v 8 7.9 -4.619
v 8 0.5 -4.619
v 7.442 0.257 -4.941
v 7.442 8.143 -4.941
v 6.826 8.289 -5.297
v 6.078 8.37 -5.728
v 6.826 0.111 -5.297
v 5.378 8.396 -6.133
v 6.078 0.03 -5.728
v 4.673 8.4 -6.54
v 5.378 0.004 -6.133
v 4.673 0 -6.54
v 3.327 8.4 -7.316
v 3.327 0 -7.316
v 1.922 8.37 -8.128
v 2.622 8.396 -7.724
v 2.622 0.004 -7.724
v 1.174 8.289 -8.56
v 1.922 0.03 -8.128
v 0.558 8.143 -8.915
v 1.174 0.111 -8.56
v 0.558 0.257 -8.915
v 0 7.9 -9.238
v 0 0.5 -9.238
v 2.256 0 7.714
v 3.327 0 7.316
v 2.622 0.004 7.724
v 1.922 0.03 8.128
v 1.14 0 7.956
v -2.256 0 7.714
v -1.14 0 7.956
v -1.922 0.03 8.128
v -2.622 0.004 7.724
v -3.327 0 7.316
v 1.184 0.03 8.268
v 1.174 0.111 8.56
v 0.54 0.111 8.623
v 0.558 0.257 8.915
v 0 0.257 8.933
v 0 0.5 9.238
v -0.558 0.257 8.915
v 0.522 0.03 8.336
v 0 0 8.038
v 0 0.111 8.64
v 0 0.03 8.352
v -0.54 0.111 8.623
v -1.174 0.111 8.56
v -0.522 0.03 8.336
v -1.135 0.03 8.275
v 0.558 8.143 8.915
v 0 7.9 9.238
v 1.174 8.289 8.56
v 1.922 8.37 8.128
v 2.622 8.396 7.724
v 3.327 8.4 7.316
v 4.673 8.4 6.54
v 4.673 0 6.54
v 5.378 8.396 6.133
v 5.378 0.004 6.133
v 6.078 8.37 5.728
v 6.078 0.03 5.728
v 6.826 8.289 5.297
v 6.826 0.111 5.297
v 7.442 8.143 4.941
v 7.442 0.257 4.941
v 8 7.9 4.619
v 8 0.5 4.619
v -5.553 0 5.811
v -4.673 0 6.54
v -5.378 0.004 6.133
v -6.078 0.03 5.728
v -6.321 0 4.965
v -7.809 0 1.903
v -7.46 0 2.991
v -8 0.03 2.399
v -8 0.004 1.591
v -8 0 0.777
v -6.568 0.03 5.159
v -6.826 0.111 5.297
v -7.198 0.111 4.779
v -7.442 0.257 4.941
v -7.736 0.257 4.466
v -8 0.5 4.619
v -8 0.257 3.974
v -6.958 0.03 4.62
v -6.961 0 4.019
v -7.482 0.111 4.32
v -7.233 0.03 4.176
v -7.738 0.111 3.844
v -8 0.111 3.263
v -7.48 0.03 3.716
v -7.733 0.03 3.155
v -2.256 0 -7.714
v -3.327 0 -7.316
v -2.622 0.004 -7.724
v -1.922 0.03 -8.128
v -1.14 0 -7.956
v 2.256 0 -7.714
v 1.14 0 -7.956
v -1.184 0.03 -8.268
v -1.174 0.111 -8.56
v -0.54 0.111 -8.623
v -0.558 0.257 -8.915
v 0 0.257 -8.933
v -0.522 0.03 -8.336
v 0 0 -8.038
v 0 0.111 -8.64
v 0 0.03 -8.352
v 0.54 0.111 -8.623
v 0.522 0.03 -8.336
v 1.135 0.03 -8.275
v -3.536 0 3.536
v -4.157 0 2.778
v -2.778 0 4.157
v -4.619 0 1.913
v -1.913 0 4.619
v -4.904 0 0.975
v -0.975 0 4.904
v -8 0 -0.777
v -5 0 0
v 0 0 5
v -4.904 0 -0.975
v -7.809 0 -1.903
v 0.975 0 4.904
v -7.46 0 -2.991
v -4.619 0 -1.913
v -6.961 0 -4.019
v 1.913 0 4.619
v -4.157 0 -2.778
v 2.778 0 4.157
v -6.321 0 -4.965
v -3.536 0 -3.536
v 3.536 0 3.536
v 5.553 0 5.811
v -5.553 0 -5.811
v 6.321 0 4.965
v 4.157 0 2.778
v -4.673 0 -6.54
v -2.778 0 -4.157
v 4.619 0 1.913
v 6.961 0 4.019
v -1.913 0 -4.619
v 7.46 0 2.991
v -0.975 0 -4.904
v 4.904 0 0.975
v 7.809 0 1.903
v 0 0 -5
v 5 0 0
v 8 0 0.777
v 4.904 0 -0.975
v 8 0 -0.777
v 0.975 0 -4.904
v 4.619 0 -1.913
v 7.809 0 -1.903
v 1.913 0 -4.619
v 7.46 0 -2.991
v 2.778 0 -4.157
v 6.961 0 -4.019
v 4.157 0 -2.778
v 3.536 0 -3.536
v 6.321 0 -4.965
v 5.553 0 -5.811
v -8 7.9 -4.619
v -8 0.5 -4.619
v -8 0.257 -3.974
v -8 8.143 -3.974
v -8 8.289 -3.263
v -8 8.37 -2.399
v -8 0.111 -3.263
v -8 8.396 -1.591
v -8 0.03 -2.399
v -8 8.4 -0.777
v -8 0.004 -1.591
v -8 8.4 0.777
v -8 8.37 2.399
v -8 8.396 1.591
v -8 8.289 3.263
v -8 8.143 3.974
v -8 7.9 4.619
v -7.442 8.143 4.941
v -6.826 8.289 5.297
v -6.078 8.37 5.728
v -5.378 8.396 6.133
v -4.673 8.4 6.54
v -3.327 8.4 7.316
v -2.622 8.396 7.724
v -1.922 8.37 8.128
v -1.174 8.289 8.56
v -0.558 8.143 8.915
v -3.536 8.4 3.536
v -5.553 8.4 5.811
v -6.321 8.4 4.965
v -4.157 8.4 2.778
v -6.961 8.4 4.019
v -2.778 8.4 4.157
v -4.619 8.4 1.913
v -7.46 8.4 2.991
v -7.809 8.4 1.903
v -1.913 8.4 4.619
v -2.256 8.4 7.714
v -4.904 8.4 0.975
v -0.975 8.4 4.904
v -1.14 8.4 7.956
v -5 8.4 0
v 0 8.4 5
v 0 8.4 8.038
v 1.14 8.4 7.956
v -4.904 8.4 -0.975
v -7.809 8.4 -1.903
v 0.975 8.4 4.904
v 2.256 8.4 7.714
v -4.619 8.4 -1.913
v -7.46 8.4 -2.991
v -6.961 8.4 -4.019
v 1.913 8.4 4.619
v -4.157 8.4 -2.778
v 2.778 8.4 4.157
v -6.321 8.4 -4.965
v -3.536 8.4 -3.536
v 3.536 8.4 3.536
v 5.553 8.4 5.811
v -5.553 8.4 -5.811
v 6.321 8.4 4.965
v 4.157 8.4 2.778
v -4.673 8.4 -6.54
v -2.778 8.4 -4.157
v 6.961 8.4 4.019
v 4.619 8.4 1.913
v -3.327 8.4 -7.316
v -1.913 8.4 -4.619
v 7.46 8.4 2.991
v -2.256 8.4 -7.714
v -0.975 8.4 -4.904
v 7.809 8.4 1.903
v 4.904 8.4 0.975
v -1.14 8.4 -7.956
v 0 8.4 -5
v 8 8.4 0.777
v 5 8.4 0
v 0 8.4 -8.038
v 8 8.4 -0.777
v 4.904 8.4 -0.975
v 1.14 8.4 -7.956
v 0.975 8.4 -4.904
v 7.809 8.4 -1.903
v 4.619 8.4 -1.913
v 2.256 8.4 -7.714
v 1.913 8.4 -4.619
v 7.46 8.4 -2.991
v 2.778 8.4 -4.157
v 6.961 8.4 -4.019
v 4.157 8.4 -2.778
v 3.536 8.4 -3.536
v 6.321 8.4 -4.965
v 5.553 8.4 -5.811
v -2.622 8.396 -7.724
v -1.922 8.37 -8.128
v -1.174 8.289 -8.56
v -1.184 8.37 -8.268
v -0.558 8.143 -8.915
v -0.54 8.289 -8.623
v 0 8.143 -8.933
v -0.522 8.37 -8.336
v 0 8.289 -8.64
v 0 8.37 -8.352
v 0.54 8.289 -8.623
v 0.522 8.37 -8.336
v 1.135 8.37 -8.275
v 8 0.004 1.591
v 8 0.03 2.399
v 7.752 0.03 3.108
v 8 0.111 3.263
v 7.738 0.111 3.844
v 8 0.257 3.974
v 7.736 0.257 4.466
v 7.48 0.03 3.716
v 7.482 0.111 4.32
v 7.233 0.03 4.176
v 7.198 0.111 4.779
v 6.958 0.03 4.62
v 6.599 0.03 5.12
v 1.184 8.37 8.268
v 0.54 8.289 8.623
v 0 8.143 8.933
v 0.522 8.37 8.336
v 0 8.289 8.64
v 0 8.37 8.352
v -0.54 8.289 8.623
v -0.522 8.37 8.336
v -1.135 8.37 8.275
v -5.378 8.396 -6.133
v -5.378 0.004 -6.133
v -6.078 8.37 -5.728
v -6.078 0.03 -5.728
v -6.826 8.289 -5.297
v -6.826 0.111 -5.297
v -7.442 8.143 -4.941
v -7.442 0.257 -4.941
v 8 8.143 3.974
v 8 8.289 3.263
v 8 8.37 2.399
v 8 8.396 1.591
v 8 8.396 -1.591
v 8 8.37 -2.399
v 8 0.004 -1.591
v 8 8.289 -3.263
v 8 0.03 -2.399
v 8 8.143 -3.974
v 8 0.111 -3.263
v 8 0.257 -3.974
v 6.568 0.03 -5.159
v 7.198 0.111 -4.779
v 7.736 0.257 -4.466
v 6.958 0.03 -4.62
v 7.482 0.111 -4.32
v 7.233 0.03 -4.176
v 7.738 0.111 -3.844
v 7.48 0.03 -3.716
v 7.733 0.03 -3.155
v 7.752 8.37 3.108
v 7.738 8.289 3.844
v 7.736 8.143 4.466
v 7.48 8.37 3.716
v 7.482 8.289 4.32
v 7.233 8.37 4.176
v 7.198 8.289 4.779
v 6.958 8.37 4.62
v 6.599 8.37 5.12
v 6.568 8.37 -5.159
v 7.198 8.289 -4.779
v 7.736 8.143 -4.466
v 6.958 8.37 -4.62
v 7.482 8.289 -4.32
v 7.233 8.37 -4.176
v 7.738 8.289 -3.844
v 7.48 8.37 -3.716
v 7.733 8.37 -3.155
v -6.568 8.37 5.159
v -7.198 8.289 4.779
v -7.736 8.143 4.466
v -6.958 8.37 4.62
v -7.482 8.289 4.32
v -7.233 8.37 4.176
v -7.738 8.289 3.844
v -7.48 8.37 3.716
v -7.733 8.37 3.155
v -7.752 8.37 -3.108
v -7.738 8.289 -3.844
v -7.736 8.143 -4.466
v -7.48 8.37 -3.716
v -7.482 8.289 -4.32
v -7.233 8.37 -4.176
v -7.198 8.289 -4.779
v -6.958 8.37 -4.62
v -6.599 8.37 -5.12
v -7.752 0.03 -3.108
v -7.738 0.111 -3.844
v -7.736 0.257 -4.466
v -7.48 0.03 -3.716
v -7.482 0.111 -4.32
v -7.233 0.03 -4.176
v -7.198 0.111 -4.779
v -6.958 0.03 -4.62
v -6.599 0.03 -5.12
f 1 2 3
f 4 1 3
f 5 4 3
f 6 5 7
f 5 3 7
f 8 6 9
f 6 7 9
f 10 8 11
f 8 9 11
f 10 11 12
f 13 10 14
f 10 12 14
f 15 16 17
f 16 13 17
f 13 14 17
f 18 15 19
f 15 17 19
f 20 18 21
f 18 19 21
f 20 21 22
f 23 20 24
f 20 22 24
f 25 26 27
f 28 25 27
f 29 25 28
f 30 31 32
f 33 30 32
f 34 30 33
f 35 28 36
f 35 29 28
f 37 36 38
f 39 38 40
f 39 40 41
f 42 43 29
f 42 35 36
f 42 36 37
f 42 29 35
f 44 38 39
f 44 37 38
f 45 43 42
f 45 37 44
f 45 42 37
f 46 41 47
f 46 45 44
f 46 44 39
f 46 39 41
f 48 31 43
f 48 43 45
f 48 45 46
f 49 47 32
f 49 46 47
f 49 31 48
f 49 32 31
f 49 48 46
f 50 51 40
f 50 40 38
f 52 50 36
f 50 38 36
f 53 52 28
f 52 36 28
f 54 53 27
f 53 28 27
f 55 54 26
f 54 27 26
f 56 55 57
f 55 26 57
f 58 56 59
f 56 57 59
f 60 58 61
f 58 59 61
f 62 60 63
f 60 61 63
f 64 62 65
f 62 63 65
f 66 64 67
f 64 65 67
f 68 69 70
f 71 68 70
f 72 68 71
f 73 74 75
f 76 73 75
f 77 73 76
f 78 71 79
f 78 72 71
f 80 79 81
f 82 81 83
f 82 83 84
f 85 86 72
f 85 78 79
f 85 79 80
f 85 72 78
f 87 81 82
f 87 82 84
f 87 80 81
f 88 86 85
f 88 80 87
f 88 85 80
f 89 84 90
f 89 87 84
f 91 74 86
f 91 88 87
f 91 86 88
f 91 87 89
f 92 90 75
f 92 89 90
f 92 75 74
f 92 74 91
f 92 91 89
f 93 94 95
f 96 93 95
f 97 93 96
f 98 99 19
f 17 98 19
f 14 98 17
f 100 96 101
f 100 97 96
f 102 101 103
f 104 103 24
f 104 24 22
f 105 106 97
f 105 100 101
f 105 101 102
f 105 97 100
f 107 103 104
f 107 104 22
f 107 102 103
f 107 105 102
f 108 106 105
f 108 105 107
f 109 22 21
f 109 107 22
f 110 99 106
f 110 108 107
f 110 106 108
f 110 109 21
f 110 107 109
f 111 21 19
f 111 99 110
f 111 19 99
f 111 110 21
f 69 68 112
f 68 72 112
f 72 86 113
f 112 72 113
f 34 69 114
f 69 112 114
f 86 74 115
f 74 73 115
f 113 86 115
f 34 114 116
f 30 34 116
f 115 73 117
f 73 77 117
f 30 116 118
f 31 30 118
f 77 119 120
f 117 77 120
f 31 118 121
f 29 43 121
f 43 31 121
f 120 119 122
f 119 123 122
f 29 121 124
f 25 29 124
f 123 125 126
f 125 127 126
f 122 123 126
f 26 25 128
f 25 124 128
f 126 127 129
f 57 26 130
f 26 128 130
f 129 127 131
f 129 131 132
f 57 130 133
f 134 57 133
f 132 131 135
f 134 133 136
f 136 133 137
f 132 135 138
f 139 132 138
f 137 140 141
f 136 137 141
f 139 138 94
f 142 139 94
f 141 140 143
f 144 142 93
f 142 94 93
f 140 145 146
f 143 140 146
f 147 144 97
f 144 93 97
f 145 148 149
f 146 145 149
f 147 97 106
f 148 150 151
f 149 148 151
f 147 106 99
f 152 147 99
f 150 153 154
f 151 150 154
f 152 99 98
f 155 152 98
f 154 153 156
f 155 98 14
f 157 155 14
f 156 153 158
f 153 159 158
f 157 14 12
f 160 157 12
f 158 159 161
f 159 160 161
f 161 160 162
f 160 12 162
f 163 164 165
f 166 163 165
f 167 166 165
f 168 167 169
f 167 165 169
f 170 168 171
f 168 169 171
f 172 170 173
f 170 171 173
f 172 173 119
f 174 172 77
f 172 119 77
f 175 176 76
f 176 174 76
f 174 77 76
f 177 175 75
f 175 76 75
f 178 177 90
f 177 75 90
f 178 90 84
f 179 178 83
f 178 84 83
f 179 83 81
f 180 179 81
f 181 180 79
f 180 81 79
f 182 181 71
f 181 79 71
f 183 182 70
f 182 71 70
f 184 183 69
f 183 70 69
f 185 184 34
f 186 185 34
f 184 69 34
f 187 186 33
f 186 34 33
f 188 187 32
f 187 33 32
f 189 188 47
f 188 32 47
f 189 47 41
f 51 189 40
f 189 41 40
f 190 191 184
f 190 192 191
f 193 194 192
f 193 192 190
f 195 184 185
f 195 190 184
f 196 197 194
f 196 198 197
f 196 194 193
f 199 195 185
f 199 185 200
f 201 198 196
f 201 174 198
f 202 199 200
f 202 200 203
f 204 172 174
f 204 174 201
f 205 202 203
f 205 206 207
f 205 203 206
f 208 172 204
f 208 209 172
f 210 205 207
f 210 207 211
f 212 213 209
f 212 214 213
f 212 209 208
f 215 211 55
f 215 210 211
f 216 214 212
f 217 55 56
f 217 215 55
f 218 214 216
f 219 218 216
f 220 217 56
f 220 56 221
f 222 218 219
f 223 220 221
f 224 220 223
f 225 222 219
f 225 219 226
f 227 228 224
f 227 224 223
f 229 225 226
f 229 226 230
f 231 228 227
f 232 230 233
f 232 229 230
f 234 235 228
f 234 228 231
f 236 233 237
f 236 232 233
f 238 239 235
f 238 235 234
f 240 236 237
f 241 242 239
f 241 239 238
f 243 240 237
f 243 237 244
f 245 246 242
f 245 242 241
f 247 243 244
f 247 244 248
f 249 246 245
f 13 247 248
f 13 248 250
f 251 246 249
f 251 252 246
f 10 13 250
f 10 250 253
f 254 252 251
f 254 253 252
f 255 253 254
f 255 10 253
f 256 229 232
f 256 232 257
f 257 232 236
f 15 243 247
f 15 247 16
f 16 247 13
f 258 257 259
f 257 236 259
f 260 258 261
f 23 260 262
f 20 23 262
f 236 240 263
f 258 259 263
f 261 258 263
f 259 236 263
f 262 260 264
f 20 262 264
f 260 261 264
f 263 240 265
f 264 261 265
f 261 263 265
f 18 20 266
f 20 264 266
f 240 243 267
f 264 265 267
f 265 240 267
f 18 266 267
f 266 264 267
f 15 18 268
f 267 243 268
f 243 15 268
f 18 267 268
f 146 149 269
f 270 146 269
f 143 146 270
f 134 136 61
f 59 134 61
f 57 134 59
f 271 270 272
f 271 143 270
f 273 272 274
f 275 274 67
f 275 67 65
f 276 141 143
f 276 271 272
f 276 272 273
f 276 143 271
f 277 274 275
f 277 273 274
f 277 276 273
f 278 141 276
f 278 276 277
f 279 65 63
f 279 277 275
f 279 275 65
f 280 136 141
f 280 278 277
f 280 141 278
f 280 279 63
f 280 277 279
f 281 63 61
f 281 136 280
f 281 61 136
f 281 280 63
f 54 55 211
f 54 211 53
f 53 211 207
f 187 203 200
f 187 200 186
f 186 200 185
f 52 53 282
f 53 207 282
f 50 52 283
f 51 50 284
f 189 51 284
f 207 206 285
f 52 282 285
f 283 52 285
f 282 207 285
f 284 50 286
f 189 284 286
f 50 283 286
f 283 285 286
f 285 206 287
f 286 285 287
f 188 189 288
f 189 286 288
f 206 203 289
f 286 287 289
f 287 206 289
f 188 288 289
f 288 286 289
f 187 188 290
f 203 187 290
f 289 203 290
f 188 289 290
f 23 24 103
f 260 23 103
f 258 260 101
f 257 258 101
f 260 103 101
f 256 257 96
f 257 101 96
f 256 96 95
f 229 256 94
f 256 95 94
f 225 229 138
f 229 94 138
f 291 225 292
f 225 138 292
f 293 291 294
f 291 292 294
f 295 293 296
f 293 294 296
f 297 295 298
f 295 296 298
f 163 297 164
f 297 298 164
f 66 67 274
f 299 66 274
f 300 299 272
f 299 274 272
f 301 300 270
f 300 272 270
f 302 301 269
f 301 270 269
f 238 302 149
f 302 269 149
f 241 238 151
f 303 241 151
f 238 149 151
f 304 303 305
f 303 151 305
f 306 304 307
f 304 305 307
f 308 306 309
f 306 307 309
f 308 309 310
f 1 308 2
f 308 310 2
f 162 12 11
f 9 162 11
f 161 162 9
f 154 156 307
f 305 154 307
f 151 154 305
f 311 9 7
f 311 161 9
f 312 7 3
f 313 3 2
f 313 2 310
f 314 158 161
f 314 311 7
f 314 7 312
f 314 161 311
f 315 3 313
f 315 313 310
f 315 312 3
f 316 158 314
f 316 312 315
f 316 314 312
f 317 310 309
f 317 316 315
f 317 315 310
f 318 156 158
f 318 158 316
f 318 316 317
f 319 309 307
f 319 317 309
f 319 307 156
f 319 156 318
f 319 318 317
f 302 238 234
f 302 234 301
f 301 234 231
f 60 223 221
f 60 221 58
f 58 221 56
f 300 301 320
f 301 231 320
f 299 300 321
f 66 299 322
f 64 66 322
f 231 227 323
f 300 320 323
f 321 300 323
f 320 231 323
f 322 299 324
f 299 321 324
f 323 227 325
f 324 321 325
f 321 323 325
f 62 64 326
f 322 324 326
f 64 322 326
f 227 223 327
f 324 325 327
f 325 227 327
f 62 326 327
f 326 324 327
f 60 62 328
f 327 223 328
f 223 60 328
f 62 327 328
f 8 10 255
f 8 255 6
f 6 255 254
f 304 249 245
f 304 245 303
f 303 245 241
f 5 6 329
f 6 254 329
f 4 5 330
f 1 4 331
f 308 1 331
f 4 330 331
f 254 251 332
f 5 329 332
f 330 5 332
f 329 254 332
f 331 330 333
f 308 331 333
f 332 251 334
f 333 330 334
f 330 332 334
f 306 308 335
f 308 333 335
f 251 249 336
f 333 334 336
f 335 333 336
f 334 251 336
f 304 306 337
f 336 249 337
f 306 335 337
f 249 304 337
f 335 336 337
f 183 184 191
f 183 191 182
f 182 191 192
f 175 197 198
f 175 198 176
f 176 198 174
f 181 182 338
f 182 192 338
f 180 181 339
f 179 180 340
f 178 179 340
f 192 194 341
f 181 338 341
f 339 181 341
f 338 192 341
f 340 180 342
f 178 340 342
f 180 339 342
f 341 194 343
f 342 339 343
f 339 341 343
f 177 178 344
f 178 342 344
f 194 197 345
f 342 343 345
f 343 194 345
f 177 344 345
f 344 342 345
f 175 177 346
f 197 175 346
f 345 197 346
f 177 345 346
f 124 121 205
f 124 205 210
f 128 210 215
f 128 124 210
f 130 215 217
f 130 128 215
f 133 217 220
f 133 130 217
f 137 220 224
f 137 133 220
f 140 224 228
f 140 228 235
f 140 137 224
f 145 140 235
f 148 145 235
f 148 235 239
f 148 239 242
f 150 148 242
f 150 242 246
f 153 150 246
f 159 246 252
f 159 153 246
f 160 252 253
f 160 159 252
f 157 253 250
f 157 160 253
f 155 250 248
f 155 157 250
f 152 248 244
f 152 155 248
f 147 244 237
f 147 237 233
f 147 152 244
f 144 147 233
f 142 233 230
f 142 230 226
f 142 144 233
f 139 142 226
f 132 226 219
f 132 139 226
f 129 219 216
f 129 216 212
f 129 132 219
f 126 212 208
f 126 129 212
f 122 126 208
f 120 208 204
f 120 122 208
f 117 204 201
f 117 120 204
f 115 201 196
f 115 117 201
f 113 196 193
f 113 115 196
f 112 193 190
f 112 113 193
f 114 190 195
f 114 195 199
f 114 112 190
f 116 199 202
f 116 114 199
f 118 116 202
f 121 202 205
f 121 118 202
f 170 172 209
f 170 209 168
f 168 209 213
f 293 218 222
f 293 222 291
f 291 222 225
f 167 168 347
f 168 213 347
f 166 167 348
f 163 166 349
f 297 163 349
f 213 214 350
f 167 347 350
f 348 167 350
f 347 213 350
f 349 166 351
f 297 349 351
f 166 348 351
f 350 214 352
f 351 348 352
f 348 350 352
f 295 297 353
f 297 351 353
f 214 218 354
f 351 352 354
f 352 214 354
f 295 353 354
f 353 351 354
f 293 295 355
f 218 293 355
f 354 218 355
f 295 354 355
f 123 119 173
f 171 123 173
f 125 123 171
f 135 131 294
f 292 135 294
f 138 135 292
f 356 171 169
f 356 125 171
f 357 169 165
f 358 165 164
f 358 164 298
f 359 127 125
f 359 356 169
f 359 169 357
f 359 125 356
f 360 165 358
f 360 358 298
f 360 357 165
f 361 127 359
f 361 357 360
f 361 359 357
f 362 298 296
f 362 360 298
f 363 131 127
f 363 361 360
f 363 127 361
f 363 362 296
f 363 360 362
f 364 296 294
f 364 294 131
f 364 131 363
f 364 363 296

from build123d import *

# Parameters (mm, degrees)
SKIZZE1_R                       = 5
AUFSATZ_LINEAR_AUSTRAGEN1_DEPTH = 8.4


with BuildPart() as part:
    # Skizze1 → Aufsatz-Linear austragen1 (new body)
    with BuildSketch(Plane(origin=(0, 0, 0), x_dir=(1, 0, 0), z_dir=(0, 1, 0))):
        Polygon((0, 9.237604307), (-8, 4.618802154), (-8, -4.618802154), (0, -9.237604307), (8, -4.618802154), (8, 4.618802154), align=None)
        with Locations(Location((0, 0, 0), (0, 0, 270))):
            Circle(SKIZZE1_R, mode=Mode.SUBTRACT)
    extrude(amount=AUFSATZ_LINEAR_AUSTRAGEN1_DEPTH)

    # Skizze2 → Schnitt-Rotation1 (revolve, cut)
    with BuildSketch(Plane(origin=(0, 0, 0), x_dir=(0, 0, -1), z_dir=(1, 0, 0))):
        with BuildLine():
            Line((8.037604307, 8.4), (9.237604307, 8.4))
            Line((9.237604307, 8.4), (9.237604307, 7.9))
            ThreePointArc((9.237604307, 7.9), (8.687604307, 8.27), (8.037604307, 8.4))
        make_face()
        with BuildLine():
            Line((8.037604307, 0), (9.237604307, 0))
            Line((9.237604307, 0), (9.237604307, 0.5))
            ThreePointArc((9.237604307, 0.5), (8.687604307, 0.13), (8.037604307, 0))
        make_face()
    revolve(axis=Axis((0, 0, 0), (0, -1, 0)), mode=Mode.SUBTRACT)


solid = part.part
